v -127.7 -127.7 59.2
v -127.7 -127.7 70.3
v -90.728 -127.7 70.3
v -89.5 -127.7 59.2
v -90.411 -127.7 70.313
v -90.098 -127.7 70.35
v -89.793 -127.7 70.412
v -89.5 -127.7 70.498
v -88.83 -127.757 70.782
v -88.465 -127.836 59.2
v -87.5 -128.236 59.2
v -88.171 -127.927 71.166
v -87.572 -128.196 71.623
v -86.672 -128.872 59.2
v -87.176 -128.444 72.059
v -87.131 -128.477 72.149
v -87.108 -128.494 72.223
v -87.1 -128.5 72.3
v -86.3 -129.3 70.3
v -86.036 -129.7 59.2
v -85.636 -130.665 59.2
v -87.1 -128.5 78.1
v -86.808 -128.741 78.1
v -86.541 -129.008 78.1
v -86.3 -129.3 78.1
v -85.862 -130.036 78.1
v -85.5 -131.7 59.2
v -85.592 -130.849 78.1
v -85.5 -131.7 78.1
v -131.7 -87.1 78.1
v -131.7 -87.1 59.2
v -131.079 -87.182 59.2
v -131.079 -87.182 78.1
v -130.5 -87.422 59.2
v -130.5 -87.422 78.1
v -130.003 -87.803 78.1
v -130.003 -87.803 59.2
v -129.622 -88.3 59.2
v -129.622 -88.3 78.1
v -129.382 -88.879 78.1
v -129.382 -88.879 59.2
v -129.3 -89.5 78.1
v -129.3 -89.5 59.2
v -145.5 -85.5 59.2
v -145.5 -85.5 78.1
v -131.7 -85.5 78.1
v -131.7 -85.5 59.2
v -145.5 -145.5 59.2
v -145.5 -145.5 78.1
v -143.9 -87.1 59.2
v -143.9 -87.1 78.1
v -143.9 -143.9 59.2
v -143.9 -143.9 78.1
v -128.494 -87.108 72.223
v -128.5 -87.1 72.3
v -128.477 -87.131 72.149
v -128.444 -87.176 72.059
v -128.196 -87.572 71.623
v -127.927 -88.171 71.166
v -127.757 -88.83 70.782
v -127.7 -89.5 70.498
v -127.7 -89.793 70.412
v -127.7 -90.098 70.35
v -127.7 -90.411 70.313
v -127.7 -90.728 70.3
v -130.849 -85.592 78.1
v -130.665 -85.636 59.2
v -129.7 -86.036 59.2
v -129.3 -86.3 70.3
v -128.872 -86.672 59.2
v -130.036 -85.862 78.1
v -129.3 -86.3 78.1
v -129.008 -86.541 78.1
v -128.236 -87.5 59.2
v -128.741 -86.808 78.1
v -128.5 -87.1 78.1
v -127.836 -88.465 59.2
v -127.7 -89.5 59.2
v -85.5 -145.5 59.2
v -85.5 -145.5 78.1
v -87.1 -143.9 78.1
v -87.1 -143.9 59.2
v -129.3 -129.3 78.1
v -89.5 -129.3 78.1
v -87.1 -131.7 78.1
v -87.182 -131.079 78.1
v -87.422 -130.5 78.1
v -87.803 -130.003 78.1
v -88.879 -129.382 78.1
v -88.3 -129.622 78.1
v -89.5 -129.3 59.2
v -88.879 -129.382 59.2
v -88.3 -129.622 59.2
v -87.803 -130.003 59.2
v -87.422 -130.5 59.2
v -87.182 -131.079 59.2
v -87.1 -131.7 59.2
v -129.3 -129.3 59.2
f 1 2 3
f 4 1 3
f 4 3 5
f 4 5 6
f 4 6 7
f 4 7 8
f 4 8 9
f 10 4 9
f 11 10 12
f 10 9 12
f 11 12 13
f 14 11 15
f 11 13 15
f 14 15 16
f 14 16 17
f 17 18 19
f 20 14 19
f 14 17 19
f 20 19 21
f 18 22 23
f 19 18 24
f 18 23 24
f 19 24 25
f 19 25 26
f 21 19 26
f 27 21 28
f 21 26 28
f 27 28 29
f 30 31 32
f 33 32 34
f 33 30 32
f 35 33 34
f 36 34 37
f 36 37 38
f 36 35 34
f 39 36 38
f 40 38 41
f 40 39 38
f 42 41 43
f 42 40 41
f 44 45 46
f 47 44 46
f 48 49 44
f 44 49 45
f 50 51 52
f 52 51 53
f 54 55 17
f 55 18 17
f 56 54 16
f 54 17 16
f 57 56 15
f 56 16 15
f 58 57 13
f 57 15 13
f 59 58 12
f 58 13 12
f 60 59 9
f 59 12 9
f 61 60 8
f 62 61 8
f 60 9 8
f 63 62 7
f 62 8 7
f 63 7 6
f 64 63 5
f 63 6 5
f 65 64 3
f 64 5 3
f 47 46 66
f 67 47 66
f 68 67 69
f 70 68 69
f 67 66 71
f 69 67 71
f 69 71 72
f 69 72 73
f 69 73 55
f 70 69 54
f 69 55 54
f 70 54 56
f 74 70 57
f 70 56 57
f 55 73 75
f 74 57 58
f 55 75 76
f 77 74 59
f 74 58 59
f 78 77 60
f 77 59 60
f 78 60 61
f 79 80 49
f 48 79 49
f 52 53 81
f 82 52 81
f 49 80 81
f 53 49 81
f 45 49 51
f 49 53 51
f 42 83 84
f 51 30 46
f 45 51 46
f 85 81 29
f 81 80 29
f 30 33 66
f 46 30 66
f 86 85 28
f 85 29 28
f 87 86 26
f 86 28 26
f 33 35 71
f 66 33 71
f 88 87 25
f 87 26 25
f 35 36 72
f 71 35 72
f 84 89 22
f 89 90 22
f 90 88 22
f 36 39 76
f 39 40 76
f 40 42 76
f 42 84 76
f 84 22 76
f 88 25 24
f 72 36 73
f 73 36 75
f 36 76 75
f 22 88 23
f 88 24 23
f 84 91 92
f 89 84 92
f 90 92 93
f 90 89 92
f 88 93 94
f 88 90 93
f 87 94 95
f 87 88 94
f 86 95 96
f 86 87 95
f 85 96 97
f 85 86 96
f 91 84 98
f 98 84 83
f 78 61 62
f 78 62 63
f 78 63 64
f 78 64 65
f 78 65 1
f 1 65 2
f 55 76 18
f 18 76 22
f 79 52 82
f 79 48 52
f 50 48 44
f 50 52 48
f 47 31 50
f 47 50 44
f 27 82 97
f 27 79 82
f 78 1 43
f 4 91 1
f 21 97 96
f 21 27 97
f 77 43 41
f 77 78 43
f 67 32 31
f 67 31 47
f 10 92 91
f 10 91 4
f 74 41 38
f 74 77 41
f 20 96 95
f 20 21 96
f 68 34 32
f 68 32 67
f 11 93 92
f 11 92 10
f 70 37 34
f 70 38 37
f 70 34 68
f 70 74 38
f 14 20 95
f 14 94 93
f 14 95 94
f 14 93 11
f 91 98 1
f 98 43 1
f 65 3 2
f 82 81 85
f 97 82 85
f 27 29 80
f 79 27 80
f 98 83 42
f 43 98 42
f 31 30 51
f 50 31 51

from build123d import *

# Parameters (mm, degrees)
PAD074_DEPTH            = 18.9
PAD078_DEPTH            = 7.8
FILLET020_R             = 2
BODY067_ROLL_ANGLE      = 180
BODY067_PLACEMENT_ANGLE = 90


with BuildPart() as part:
    # Sketch124 → Pad074 (new body)
    with BuildSketch(Plane.XY):
        with BuildLine():
            Line((-30, 30), (-30, -30))
            Line((-30, -30), (30, -30))
            Line((30, -30), (30, -16.2))
            ThreePointArc((30, -16.2), (28.828427, -13.371573), (26, -12.2))
            Line((26, -12.2), (-12.2, -12.2))
            Line((-12.2, -12.2), (-12.2, 26))
            ThreePointArc((-12.2, 26), (-13.371573, 28.828427), (-16.2, 30))
            Line((-16.2, 30), (-30, 30))
        make_face()
        with BuildLine():
            Line((-28.4, 28.4), (-16.2, 28.4))
            ThreePointArc((-13.8, 26), (-14.502944, 27.697056), (-16.2, 28.4))
            Line((-13.8, 26), (-13.8, -13.8))
            Line((-13.8, -13.8), (26, -13.8))
            ThreePointArc((28.4, -16.2), (27.697056, -14.502944), (26, -13.8))
            Line((28.4, -16.2), (28.4, -28.4))
            Line((28.4, -28.4), (-28.4, -28.4))
            Line((-28.4, -28.4), (-28.4, 28.4))
        make_face(mode=Mode.SUBTRACT)
    extrude(amount=PAD074_DEPTH)

    # Sketch128 → Pad078 (join)
    with BuildSketch(Plane.XY):
        Polygon((-13.8, 29.2), (-13.8, -13.8), (29.2, -13.8), align=None)
    extrude(amount=PAD078_DEPTH)

    # Fillet020
    fillet020_edges = [part.edges().sort_by_distance(p)[0] for p in [
        (7.7, 7.7, 7.8),
    ]]
    fillet(fillet020_edges, radius=FILLET020_R)


with BuildPart() as part_1:
    # Body067 roll: moved
    add(part.part.rotate(Axis((0, 0, 0), (1, 0, 0)), BODY067_ROLL_ANGLE))


with BuildPart() as part_2:
    # Body067 placement: moved
    add(part_1.part.moved(Location((-115.5, -115.5, 78.1))).rotate(Axis((-115.5, -115.5, 78.1), (0, 0, 1)), BODY067_PLACEMENT_ANGLE))


solid = part_2.part
